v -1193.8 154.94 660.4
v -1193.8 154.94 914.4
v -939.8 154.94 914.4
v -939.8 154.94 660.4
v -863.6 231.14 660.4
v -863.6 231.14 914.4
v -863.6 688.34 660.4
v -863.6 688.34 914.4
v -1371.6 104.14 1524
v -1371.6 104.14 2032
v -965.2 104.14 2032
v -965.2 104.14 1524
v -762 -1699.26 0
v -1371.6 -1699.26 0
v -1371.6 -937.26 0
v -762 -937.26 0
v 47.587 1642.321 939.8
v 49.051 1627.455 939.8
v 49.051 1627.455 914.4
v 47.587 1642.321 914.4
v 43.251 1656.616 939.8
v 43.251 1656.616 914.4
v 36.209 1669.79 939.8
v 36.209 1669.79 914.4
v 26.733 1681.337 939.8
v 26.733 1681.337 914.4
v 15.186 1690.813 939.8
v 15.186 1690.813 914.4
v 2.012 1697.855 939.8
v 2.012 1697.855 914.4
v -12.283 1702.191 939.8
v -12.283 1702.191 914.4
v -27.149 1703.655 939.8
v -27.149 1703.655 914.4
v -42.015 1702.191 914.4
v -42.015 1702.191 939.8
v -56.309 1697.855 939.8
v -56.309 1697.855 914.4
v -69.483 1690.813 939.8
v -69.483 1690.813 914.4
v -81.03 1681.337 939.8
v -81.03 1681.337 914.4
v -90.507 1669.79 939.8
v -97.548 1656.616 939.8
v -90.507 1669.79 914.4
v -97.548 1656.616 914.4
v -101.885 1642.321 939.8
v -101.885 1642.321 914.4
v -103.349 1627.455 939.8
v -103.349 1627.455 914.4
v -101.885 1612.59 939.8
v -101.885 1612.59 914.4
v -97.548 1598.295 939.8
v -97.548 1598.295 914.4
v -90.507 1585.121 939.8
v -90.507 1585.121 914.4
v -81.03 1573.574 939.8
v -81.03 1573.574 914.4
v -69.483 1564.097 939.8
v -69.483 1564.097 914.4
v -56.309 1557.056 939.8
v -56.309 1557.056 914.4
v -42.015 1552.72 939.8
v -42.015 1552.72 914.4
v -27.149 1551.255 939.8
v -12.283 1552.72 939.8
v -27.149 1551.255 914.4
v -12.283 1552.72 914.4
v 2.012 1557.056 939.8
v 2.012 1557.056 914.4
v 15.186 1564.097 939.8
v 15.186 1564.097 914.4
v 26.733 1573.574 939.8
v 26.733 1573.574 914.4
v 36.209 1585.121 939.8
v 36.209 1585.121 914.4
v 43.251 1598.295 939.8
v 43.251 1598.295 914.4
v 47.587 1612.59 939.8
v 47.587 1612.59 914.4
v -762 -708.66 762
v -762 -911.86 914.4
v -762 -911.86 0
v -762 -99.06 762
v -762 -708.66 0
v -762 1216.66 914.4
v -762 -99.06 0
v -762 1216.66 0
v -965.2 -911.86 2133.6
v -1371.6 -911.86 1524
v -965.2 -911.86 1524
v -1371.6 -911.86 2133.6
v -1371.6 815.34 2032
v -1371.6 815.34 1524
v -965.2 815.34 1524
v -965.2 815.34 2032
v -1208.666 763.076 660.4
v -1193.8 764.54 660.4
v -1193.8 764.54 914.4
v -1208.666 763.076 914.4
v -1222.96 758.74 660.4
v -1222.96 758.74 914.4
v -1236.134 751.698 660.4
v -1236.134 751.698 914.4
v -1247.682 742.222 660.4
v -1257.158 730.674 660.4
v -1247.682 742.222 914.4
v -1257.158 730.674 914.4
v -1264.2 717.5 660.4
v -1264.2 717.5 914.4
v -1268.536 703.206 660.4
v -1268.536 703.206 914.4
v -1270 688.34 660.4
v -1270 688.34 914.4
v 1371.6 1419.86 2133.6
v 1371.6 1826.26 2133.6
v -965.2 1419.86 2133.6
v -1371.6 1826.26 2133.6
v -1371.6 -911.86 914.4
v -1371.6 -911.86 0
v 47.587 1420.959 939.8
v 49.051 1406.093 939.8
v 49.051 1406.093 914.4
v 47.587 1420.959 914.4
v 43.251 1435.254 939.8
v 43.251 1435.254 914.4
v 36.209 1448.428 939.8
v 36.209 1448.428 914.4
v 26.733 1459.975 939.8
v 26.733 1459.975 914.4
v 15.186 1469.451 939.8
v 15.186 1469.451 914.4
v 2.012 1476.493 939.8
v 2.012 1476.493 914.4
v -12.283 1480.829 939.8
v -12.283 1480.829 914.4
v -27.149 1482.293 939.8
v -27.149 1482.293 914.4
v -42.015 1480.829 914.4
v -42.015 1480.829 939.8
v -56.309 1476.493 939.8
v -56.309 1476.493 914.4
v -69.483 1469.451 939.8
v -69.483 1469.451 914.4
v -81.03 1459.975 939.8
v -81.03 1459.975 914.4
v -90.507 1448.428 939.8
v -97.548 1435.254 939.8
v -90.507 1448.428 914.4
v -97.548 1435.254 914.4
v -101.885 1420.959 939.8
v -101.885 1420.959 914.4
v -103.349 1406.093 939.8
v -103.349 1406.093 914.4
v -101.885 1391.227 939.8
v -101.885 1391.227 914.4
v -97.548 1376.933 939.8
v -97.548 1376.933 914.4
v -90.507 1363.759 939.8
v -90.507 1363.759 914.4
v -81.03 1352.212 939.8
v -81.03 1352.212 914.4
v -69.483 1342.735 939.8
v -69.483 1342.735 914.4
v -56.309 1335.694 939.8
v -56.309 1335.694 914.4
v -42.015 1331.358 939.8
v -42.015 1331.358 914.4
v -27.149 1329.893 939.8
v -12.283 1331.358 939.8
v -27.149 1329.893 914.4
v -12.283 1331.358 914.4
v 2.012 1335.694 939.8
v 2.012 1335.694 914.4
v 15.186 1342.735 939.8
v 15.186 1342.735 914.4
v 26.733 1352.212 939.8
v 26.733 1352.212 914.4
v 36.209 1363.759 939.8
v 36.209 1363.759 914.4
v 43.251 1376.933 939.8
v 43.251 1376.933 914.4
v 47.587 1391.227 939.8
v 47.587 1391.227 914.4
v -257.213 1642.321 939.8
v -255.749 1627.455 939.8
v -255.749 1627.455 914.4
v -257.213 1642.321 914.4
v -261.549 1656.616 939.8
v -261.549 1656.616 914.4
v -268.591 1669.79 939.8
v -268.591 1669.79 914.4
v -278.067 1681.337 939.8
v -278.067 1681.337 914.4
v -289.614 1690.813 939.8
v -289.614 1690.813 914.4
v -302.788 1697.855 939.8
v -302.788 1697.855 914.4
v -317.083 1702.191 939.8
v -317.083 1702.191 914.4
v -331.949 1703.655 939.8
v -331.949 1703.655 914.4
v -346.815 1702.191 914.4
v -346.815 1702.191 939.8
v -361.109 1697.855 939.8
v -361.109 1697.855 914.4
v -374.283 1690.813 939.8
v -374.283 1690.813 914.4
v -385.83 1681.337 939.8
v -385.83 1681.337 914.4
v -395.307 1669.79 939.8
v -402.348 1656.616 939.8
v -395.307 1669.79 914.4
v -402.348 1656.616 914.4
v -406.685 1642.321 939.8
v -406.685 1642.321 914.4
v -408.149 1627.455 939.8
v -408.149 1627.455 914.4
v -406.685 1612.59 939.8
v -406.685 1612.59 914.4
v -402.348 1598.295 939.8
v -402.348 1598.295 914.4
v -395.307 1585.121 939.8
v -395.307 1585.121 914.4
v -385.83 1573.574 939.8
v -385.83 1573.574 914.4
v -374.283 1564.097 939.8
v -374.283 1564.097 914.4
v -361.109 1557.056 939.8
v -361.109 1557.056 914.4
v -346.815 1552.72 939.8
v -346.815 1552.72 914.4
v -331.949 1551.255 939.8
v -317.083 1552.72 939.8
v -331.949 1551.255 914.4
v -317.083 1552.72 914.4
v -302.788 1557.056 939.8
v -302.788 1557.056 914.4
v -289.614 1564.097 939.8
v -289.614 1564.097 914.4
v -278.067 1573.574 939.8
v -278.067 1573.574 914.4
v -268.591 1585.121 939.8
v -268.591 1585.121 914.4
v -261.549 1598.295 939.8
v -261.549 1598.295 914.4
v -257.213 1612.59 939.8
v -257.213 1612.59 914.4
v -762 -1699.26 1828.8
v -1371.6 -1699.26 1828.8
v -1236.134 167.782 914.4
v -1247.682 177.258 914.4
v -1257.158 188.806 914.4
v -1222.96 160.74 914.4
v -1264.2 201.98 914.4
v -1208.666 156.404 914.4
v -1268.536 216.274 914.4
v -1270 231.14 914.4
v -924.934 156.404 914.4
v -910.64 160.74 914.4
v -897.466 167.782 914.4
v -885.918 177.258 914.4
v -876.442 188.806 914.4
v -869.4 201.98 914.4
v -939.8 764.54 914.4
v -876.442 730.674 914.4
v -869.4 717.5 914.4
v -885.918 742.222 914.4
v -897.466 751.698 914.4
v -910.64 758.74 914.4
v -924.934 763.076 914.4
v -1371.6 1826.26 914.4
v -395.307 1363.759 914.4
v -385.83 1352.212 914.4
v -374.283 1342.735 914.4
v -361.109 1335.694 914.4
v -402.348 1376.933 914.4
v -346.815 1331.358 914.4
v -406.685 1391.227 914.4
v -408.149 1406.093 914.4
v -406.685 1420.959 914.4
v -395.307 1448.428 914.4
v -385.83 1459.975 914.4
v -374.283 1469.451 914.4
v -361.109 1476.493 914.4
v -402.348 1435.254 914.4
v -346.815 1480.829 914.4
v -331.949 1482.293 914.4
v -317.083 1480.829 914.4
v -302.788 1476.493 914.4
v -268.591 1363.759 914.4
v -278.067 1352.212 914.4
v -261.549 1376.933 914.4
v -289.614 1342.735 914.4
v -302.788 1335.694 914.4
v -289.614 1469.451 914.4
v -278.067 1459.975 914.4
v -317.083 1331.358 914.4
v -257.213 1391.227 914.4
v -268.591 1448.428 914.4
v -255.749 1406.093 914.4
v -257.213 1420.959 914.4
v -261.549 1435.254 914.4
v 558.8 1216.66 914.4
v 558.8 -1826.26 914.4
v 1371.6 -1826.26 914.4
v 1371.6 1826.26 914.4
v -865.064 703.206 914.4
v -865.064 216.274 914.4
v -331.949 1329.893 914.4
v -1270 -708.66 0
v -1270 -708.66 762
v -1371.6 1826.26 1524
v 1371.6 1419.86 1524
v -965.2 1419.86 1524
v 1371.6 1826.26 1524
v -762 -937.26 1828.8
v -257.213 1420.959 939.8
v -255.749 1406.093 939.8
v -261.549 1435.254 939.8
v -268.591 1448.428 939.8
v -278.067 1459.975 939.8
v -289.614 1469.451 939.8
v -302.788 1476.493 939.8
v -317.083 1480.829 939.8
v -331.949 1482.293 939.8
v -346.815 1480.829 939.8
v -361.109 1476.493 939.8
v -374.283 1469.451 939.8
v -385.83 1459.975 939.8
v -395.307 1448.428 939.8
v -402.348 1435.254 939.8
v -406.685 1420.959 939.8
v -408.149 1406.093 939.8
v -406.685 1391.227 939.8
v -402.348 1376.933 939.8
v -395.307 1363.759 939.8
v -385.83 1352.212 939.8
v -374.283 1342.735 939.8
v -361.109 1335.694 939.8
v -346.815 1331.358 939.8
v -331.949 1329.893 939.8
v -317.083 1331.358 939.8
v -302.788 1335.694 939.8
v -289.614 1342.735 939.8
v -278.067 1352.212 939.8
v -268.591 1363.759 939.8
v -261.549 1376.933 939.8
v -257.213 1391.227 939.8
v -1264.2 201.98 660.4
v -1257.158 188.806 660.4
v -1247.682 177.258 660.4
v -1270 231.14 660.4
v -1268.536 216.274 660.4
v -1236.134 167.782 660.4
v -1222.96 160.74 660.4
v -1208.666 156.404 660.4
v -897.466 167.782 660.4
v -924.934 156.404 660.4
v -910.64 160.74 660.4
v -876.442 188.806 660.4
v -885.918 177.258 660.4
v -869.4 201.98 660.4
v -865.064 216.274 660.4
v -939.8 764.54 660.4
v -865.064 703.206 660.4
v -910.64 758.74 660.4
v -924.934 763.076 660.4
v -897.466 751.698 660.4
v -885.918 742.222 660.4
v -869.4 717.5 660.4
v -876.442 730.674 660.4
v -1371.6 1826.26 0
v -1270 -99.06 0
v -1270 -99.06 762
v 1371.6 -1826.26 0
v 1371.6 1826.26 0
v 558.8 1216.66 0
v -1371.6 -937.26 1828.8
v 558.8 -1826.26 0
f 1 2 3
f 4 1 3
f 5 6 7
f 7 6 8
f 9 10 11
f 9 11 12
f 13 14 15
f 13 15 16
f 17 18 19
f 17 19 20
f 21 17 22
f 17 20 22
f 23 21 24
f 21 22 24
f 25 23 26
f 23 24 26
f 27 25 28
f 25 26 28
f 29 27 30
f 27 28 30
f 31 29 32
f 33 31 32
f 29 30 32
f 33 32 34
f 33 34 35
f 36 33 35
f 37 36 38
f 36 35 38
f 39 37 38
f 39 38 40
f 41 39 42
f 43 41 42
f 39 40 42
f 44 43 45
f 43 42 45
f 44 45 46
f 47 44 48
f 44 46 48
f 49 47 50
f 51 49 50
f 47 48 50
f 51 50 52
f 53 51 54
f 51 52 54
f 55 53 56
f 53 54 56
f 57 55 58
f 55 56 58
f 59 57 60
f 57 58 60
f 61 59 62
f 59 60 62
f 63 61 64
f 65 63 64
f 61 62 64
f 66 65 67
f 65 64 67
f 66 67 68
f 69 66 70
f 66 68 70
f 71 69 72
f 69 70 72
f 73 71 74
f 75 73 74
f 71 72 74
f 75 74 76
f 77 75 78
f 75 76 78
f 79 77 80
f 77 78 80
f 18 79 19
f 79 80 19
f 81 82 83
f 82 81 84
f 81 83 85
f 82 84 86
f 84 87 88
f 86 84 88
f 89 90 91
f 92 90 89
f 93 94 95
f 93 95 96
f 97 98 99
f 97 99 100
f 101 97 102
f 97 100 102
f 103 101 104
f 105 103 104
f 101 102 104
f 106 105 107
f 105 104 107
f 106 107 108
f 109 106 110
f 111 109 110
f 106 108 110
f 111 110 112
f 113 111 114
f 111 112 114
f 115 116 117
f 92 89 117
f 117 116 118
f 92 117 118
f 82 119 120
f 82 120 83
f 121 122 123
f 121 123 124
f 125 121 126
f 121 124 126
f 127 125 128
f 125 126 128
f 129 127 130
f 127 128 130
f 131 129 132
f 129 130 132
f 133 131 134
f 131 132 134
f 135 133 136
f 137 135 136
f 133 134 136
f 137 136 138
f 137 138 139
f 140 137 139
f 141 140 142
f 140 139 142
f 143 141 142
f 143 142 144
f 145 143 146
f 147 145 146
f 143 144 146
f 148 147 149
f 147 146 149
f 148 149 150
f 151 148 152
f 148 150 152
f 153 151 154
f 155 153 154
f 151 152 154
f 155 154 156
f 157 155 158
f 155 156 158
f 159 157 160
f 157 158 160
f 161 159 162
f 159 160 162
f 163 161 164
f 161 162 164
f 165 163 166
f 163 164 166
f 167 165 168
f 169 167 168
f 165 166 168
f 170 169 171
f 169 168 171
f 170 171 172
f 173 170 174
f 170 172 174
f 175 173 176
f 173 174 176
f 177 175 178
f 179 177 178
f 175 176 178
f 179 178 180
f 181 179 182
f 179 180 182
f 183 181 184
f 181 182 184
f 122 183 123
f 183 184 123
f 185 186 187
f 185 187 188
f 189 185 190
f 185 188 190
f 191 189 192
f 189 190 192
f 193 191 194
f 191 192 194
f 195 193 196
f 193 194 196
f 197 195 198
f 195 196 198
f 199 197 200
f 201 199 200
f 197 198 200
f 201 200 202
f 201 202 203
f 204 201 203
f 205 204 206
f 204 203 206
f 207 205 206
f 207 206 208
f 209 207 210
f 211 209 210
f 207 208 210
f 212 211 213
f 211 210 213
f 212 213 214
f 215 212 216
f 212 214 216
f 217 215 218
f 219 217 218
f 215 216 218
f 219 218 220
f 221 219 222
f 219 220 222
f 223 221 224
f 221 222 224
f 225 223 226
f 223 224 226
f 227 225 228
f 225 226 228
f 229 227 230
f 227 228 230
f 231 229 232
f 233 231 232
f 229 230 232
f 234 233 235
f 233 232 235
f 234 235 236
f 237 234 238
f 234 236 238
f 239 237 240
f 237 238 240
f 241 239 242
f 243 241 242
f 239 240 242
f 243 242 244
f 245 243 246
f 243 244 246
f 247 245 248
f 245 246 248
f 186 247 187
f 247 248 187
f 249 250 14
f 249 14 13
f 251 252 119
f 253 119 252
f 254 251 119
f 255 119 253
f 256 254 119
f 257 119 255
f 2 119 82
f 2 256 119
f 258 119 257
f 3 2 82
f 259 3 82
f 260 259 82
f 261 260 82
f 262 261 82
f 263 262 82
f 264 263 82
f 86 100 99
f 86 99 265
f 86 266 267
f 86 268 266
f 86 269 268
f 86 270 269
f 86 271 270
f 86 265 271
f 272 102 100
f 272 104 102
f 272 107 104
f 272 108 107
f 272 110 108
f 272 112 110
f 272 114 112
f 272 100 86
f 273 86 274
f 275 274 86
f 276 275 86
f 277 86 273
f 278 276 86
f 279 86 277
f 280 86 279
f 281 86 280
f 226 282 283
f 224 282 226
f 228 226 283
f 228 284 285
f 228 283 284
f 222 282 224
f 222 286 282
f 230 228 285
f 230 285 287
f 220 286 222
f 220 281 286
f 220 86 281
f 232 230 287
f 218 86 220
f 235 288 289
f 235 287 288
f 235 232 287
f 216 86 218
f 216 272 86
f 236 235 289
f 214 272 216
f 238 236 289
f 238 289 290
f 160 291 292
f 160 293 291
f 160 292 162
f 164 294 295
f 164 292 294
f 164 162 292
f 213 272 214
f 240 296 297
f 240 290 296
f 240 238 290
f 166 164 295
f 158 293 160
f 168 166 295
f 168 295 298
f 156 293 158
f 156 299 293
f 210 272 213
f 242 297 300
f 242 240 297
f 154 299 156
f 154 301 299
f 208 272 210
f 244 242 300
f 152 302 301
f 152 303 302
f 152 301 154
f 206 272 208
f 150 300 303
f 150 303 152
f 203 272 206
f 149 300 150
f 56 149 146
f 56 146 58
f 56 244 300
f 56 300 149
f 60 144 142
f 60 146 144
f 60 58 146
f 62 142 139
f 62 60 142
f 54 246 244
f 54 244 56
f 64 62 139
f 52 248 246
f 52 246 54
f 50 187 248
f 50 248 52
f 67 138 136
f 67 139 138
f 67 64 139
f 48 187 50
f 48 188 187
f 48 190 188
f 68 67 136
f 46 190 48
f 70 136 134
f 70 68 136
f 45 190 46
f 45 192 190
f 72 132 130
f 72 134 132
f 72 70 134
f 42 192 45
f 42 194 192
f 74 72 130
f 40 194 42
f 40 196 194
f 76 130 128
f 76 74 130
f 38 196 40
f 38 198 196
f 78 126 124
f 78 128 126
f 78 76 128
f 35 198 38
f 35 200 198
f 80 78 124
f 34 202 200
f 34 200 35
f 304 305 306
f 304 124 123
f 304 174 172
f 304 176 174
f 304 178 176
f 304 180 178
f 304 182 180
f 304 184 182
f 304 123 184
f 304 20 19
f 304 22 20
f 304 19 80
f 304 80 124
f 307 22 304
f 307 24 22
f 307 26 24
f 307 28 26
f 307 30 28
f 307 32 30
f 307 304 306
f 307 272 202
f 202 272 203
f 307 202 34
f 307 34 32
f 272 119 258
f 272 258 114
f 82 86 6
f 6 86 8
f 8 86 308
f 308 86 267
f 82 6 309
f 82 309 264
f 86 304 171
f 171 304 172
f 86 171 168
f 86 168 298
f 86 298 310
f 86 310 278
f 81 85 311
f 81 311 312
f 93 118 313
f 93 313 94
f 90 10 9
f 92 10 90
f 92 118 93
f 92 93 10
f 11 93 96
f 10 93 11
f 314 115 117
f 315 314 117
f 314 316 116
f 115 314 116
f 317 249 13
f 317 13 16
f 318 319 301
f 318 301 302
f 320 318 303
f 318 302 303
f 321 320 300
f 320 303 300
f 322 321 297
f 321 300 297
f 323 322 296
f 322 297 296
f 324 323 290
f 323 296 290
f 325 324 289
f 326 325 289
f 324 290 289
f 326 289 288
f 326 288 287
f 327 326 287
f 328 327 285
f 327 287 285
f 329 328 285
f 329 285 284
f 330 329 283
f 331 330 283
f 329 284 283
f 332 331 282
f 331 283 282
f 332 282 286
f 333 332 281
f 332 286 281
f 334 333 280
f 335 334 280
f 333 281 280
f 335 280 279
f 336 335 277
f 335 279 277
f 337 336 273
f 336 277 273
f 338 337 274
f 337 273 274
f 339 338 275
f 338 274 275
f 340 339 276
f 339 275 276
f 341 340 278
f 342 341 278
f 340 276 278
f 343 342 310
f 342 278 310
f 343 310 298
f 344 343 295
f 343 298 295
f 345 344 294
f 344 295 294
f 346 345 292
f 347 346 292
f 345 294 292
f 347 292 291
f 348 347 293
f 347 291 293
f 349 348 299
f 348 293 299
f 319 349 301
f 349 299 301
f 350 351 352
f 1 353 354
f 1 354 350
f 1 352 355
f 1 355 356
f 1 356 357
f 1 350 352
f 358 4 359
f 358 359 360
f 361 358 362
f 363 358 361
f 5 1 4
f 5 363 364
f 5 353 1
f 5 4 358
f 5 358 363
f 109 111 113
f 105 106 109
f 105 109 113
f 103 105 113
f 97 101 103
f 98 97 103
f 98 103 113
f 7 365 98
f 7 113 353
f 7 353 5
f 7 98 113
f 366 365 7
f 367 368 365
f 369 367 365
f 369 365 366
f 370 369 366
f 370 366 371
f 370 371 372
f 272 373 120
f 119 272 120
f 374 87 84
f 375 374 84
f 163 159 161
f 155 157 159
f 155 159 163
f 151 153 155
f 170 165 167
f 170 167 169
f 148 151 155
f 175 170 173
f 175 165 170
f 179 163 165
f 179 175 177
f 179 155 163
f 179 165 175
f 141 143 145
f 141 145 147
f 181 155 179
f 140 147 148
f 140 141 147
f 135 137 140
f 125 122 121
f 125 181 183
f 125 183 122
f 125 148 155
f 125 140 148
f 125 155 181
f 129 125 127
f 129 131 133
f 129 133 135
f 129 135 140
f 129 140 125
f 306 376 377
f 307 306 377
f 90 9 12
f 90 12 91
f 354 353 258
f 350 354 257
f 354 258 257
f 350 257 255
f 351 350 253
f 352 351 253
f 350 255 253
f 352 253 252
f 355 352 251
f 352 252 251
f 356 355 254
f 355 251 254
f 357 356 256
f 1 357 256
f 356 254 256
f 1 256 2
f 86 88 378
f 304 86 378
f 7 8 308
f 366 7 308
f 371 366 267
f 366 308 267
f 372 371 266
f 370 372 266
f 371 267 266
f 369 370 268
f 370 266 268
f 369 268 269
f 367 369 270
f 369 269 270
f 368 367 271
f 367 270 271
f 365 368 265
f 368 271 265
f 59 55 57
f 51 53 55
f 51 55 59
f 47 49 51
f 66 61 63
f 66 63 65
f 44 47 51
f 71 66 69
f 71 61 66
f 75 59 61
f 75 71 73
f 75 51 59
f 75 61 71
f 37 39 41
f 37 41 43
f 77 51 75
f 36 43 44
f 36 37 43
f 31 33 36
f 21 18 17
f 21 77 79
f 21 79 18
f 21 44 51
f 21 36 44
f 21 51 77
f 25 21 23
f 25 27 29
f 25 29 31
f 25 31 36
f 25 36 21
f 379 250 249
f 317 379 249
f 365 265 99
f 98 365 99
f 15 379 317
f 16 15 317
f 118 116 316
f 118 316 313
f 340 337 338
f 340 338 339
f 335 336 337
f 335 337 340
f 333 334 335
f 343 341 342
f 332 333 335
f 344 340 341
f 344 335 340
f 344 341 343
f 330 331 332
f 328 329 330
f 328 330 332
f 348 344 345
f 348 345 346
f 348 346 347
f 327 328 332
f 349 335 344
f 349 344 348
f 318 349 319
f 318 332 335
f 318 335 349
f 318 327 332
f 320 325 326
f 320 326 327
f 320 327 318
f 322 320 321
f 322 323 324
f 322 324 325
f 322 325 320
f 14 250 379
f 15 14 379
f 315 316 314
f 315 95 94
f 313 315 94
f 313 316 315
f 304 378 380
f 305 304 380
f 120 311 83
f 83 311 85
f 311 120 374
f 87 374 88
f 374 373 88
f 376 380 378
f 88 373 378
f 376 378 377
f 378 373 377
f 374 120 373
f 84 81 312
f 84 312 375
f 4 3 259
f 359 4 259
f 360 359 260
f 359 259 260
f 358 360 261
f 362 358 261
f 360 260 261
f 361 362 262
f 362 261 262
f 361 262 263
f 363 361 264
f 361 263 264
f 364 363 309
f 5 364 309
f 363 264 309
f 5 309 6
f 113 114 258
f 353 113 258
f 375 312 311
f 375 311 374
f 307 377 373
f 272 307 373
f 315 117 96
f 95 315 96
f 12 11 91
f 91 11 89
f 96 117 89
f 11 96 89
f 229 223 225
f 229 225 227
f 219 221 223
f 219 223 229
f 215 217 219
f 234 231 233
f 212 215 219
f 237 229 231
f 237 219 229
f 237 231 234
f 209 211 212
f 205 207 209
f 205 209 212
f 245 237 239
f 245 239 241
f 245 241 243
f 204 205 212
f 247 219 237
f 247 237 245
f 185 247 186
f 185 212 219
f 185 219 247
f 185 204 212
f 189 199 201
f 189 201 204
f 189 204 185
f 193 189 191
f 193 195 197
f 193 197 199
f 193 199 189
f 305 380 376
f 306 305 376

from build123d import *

# Parameters (mm, degrees)
F1_DEPTH  = 914.4
F2_W      = 609.6
F2_H      = 762
F3_DEPTH  = 1828.8
F4_W      = 609.6
F4_H      = 762
F5_DEPTH  = 508
F7_DEPTH  = 254
F8_R      = 76.2
F9_DEPTH  = 25.4
F11_DEPTH = 406.4
F12_W     = 2336.8
F12_H     = 609.6
F13_DEPTH = 406.4


with BuildPart() as f1:
    # F0 (on Top) → F1 (new body)
    with BuildSketch(Plane.XY):
        Polygon((558.8, -1826.26), (1371.6, -1826.26), (1371.6, 1826.26), (-1371.6, 1826.26), (-1371.6, -911.86), (-762, -911.86), (-762, 1216.66), (558.8, 1216.66), align=None)
    extrude(amount=F1_DEPTH)

    # F4 (on face) → F5 (cut)
    with BuildSketch(Plane.YZ.offset(-762)):
        with Locations((-403.86, 381)):
            Rectangle(F4_W, F4_H)
    extrude(amount=-F5_DEPTH, mode=Mode.SUBTRACT)

    # F6 (on face) → F7 (cut)
    with BuildSketch(Plane.XY.offset(914.4)):
        with BuildLine():
            ThreePointArc((-1270, 231.14), (-1247.681537, 177.258463), (-1193.8, 154.94))
            Line((-1193.8, 154.94), (-939.8, 154.94))
            ThreePointArc((-939.8, 154.94), (-885.918463, 177.258463), (-863.6, 231.14))
            Line((-863.6, 231.14), (-863.6, 688.34))
            ThreePointArc((-863.6, 688.34), (-885.918463, 742.221537), (-939.8, 764.54))
            Line((-939.8, 764.54), (-1193.8, 764.54))
            ThreePointArc((-1193.8, 764.54), (-1247.681537, 742.221537), (-1270, 688.34))
            Line((-1270, 688.34), (-1270, 231.14))
        make_face()
    extrude(amount=-F7_DEPTH, mode=Mode.SUBTRACT)

    # F8 (on face) → F9 (join)
    with BuildSketch(Plane.XY.offset(914.4)):
        with Locations((-331.948876, 1406.093359)):
            Circle(F8_R)
        with Locations((-331.948876, 1627.455469)):
            Circle(F8_R)
        with Locations((-27.148876, 1406.093359)):
            Circle(F8_R)
        with Locations((-27.148876, 1627.455469)):
            Circle(F8_R)
    extrude(amount=F9_DEPTH)


with BuildPart() as f3:
    # F2 (on Top) → F3 (new body)
    with BuildSketch(Plane.XY):
        with Locations((-1066.8, -1318.26)):
            Rectangle(F2_W, F2_H)
    extrude(amount=F3_DEPTH)


with BuildPart() as f11:
    # F10 (on face) → F11 (new body)
    with BuildSketch(Plane(origin=(-1371.6, 0, 0), x_dir=(0, -1, 0), z_dir=(-1, 0, 0))):
        Polygon((911.86, 2133.6), (-1826.26, 2133.6), (-1826.26, 1524), (-815.34, 1524), (-815.34, 2032), (-104.14, 2032), (-104.14, 1524), (911.86, 1524), align=None)
    extrude(amount=-F11_DEPTH)

    # F12 (on face) → F13 (join)
    with BuildSketch(Plane(origin=(0, 1826.26, 0), x_dir=(-1, 0, 0), z_dir=(0, 1, 0))):
        with Locations((-203.2, 1828.8)):
            Rectangle(F12_W, F12_H)
    extrude(amount=-F13_DEPTH)


solid = Compound([f1.part, f3.part, f11.part])
